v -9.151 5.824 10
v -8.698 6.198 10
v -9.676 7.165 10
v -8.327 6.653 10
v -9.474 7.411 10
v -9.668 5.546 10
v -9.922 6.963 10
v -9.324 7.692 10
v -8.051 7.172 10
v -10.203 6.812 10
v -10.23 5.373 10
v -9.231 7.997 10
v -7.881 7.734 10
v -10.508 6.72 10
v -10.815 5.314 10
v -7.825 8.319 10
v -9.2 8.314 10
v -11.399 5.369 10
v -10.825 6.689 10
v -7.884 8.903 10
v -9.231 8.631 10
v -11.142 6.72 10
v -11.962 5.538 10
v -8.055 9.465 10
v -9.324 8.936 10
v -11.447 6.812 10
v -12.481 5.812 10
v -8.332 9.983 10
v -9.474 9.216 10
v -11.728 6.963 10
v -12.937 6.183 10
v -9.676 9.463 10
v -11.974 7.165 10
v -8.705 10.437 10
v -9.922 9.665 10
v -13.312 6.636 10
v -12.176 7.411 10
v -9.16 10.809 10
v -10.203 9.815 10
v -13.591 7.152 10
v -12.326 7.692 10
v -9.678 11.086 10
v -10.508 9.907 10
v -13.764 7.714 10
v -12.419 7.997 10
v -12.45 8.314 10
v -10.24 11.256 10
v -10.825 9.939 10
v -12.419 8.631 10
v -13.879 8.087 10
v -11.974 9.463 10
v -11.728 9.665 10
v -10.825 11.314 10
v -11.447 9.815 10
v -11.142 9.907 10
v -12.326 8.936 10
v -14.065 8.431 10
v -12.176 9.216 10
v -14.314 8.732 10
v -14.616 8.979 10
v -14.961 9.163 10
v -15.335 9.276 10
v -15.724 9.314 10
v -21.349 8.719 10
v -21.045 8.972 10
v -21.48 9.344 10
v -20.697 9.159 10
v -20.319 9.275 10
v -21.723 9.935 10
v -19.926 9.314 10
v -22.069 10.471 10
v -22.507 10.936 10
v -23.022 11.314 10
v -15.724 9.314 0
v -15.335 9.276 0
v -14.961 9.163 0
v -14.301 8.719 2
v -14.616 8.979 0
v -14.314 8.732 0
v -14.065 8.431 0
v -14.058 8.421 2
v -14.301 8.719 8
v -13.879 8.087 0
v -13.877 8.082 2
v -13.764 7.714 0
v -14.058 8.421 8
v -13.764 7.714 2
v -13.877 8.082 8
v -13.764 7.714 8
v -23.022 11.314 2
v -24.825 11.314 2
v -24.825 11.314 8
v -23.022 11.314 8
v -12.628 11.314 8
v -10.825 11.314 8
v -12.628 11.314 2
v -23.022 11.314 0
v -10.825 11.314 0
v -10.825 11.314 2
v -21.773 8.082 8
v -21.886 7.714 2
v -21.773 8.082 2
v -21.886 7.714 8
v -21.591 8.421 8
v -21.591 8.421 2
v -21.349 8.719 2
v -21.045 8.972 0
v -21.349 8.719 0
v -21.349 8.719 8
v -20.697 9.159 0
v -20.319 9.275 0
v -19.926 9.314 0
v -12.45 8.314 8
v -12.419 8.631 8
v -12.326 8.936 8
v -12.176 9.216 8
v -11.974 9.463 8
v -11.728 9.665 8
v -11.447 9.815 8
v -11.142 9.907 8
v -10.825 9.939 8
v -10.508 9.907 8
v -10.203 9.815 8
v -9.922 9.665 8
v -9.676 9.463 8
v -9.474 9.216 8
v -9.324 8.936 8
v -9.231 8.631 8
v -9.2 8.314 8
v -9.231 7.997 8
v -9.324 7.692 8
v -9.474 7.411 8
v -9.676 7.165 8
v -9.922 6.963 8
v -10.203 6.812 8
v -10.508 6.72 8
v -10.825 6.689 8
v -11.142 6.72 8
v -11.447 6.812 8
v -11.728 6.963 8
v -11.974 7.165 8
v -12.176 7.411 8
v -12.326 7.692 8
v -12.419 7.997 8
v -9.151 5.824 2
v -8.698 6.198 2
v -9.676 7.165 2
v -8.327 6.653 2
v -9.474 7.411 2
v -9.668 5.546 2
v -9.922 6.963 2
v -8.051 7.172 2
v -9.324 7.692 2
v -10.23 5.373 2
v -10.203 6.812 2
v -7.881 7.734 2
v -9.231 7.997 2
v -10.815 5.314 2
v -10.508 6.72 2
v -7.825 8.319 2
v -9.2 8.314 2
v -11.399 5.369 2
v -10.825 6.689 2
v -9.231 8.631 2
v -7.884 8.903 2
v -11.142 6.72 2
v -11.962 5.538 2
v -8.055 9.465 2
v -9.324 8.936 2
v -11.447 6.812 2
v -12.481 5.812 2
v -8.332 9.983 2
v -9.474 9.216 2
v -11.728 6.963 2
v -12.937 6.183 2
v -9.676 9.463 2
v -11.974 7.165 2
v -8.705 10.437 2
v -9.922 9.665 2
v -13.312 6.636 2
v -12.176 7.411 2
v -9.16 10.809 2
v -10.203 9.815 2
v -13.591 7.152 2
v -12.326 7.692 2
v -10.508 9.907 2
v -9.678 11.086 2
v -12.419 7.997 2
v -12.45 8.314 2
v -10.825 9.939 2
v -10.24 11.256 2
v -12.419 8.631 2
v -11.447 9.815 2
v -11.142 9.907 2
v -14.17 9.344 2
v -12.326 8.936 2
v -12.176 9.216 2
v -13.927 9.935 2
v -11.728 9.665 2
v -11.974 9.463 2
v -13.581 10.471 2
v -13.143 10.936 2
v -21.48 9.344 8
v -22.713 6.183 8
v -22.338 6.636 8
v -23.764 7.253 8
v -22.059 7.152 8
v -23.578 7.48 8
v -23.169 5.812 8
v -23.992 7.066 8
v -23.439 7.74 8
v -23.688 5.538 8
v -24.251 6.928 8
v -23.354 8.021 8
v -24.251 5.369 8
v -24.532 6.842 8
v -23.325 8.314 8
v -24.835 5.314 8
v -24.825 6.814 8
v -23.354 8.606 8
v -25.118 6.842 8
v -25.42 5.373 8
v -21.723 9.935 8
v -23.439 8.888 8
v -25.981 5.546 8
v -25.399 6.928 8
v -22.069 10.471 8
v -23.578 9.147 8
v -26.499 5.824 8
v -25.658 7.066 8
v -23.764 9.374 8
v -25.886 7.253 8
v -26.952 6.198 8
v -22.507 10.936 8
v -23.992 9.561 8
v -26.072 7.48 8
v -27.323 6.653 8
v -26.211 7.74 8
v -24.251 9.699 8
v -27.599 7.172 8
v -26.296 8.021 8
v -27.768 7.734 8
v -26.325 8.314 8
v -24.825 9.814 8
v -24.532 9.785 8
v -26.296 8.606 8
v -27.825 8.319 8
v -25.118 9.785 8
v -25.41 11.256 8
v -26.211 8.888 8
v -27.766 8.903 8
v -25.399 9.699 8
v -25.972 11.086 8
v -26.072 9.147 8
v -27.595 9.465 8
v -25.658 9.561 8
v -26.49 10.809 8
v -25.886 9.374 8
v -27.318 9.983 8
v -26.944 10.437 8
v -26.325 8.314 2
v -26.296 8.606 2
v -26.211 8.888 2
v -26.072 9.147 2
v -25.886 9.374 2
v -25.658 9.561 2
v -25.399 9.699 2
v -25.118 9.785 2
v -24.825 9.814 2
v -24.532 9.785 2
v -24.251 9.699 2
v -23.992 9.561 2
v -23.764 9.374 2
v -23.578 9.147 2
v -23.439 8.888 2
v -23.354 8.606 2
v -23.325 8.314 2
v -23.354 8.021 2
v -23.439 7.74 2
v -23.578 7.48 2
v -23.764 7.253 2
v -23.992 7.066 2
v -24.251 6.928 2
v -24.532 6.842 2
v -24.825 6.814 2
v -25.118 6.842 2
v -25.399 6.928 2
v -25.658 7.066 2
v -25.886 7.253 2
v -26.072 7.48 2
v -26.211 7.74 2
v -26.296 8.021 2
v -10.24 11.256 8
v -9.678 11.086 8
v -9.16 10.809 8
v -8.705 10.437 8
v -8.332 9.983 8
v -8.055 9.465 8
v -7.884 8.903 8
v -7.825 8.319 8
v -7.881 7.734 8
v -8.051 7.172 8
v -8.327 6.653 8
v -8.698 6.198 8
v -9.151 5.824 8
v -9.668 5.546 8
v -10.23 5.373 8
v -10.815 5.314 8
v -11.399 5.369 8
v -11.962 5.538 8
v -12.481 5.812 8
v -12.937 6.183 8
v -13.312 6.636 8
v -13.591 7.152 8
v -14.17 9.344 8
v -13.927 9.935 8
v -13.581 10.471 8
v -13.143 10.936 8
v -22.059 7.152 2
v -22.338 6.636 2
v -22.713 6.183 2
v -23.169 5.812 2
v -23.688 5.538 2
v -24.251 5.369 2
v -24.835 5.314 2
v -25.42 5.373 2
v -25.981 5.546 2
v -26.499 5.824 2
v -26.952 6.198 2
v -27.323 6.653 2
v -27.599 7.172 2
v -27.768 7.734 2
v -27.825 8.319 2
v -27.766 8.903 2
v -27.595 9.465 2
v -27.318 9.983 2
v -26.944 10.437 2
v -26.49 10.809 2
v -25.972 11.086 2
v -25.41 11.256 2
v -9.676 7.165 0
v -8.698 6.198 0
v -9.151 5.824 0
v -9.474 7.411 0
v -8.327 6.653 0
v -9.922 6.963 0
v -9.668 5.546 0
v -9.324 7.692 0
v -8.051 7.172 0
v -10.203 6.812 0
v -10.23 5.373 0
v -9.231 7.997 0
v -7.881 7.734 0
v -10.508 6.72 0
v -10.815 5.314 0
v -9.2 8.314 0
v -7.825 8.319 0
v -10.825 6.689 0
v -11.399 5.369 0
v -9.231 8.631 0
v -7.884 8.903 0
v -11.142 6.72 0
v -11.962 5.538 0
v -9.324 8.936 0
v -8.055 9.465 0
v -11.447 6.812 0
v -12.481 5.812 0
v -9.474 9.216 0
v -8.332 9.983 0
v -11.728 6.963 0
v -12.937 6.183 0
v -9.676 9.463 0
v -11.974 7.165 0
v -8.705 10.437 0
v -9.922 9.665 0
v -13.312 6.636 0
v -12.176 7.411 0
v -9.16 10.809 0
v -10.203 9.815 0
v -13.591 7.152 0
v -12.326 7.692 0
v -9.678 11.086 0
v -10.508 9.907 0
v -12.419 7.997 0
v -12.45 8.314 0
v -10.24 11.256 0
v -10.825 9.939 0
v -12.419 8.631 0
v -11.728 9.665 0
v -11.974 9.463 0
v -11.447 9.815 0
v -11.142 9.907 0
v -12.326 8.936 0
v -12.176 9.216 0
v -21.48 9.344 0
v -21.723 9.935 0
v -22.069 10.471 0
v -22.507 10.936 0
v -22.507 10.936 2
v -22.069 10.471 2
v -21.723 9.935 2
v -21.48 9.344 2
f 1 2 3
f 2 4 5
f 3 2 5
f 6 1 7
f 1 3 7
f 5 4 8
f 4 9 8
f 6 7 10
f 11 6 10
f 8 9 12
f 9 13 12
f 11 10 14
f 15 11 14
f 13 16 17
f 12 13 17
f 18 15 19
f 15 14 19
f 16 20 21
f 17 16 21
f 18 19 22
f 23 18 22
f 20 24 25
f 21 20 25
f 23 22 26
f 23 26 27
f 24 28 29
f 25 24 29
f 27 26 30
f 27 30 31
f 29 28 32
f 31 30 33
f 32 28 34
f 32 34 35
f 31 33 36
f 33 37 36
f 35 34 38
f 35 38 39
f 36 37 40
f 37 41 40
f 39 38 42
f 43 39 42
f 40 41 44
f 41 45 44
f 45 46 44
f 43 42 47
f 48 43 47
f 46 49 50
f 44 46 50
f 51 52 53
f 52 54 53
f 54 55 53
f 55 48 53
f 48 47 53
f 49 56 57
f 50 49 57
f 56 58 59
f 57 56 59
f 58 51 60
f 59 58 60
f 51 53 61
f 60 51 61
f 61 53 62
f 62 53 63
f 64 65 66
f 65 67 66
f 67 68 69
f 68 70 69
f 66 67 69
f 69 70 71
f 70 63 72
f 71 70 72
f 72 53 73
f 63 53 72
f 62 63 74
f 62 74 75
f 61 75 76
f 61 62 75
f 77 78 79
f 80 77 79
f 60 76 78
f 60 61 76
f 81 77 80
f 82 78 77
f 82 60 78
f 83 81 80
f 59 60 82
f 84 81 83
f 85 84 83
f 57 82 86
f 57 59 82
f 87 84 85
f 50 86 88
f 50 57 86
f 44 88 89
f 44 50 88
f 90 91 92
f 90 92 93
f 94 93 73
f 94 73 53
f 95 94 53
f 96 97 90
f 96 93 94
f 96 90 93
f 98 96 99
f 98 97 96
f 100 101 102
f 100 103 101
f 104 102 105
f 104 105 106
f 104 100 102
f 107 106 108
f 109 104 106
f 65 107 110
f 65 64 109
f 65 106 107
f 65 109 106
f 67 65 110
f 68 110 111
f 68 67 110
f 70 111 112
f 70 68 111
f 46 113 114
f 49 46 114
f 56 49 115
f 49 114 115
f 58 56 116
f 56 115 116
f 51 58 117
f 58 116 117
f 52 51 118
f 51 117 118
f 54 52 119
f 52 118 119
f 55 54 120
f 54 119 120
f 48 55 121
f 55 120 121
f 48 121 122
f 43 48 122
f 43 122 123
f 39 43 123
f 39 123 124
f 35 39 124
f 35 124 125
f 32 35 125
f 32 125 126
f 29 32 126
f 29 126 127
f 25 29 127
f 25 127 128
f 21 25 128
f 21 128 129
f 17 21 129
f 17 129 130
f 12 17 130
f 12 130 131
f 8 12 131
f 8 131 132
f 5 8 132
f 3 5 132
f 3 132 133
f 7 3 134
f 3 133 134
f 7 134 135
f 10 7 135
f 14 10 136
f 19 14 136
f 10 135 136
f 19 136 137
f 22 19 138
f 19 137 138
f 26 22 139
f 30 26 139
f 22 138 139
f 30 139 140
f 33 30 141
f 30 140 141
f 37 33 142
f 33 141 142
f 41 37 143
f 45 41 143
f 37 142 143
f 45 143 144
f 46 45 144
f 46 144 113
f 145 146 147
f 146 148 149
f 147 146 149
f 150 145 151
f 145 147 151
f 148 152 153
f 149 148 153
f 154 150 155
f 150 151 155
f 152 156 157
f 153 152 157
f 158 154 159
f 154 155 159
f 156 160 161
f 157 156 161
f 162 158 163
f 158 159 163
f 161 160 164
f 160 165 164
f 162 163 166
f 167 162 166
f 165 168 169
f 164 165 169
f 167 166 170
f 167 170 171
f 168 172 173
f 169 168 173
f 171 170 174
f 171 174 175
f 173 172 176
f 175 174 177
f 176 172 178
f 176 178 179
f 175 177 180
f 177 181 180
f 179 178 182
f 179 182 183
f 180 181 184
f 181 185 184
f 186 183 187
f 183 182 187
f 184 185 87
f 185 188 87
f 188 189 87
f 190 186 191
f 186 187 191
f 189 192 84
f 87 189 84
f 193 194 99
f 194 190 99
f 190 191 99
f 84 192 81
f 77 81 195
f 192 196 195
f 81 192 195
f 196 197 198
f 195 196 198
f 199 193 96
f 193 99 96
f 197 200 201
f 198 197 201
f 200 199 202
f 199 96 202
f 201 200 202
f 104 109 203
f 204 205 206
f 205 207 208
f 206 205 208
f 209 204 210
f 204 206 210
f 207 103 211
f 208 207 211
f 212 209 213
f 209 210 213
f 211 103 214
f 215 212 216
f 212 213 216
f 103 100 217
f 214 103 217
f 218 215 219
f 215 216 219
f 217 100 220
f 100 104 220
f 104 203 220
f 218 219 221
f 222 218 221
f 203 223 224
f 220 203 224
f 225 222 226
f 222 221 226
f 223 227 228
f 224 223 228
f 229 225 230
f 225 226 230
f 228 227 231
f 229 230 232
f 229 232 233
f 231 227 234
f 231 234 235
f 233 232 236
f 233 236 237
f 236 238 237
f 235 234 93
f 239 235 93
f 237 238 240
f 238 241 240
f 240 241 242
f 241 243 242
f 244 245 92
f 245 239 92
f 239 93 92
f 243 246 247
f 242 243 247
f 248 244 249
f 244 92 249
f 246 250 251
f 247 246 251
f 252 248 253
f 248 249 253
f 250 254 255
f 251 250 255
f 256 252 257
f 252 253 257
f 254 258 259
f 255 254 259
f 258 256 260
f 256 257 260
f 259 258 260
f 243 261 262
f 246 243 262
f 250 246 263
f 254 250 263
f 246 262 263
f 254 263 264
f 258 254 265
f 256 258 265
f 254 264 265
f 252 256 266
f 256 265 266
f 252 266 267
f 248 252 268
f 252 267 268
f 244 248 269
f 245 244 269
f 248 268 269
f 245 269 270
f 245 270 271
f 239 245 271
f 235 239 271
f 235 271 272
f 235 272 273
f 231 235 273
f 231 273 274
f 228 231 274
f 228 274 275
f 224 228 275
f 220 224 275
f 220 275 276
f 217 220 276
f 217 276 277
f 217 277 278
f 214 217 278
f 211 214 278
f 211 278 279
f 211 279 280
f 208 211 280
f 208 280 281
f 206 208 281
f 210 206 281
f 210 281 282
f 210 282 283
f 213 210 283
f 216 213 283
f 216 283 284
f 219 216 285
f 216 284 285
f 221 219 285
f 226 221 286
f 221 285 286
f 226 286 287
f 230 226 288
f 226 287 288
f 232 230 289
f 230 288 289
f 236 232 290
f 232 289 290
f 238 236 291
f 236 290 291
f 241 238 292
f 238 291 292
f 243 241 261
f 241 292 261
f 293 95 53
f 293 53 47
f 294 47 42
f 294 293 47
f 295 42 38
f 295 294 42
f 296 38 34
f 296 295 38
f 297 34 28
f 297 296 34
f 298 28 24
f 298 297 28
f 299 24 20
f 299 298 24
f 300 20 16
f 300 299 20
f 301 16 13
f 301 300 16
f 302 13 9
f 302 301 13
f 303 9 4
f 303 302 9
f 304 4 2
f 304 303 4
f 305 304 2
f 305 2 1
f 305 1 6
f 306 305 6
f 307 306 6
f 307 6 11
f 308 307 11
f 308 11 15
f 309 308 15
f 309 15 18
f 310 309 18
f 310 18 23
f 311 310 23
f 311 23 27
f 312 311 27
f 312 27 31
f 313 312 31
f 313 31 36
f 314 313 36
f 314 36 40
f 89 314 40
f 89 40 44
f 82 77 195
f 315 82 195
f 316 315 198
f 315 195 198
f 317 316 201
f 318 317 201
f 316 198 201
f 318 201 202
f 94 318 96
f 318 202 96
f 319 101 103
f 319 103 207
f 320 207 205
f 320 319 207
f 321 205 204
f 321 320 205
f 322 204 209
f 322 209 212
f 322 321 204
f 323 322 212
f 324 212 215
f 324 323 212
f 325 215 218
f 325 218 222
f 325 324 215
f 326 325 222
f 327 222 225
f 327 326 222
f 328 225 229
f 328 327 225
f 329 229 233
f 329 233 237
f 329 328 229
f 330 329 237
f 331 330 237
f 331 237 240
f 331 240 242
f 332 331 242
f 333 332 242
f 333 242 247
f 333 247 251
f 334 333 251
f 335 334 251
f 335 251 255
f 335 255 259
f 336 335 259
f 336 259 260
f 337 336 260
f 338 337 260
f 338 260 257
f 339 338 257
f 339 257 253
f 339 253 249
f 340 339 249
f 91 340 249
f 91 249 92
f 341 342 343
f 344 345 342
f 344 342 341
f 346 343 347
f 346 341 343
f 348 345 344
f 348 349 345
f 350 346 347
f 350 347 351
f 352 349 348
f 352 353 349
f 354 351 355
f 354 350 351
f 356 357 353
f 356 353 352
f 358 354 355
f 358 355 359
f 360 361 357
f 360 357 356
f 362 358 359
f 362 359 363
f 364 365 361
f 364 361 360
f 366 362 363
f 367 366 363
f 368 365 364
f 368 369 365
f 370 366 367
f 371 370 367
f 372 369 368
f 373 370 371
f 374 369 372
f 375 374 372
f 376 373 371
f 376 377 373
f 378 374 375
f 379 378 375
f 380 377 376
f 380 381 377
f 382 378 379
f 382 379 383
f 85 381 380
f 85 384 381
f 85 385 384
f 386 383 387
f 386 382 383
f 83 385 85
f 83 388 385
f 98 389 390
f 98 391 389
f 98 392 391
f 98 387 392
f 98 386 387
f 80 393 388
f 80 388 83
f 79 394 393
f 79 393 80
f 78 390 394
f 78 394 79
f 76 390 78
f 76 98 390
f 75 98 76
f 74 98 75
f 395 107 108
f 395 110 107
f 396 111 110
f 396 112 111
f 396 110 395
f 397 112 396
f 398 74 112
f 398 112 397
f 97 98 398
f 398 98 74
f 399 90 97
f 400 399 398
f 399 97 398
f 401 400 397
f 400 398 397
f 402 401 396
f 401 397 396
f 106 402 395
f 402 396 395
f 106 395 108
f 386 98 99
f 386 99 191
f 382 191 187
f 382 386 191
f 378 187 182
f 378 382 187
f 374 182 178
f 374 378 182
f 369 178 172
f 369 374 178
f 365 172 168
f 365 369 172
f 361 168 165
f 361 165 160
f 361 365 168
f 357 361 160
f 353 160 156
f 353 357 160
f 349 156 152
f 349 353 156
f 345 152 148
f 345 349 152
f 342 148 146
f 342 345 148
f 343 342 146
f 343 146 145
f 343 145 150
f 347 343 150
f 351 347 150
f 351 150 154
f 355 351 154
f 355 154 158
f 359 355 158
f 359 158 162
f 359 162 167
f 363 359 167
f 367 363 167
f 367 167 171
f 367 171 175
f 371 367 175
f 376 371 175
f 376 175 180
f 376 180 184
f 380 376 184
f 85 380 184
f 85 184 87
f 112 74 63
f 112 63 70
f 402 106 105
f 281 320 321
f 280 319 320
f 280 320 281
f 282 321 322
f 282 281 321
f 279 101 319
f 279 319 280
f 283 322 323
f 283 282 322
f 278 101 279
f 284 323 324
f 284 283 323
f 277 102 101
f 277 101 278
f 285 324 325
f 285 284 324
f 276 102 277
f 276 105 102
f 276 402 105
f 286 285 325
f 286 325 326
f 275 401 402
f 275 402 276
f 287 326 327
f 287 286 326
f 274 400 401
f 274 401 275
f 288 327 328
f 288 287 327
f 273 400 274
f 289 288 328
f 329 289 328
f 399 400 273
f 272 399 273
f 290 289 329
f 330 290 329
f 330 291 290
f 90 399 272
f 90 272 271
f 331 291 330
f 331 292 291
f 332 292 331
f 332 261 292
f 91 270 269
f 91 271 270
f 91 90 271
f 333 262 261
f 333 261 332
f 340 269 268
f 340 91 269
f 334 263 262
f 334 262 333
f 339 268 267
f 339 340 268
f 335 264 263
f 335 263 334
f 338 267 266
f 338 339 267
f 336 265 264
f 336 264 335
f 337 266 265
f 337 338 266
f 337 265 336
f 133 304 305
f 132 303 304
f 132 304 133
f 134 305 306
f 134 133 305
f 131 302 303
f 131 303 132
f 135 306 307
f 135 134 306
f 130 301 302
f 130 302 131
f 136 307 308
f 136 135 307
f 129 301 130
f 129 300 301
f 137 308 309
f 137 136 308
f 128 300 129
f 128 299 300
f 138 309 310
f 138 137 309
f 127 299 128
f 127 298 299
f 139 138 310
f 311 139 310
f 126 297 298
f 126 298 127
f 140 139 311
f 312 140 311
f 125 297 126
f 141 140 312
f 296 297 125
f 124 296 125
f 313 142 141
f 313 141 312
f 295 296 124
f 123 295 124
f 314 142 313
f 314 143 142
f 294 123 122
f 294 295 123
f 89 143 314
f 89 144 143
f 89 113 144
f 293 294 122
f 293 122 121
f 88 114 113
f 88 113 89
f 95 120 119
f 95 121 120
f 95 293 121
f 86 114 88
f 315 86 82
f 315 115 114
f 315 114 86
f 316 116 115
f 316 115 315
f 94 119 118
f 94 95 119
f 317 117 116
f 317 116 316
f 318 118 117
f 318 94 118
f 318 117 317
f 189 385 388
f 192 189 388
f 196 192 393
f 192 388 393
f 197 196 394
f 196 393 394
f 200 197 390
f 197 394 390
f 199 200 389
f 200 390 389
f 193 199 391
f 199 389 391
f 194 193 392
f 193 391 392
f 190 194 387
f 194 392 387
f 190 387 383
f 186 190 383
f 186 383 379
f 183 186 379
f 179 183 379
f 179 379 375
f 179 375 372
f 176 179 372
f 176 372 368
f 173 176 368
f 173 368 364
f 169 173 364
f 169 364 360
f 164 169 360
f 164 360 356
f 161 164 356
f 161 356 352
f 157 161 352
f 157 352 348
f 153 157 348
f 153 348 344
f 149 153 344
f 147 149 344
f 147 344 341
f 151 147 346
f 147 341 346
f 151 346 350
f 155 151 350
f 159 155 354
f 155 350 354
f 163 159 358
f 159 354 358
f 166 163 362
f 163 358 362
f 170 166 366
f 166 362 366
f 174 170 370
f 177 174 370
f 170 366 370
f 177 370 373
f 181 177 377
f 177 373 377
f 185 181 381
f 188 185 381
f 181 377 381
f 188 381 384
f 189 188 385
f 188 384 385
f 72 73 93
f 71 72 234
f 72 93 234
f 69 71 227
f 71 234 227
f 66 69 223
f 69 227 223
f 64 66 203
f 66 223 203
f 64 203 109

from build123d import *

# Parameters (mm, degrees)
ESTRUSIONE_ESTRUSIONE1_DEPTH = 10
SCHIZZO5_R                   = 1.625
SCHIZZO5_R_2                 = 1.5
TAGLIO_ESTRUSIONE1_DEPTH     = 10
SCHIZZO6_R                   = 3.5
TAGLIO_ESTRUSIONE2_DEPTH     = 2
TAGLIO_ESTRUSIONE3_START     = -8
SCHIZZO6_2_R                 = 3.5
TAGLIO_ESTRUSIONE3_DEPTH     = 12
TAGLIO_ESTRUSIONE4_START     = -2
SCHIZZO7_R                   = 3.5
TAGLIO_ESTRUSIONE4_DEPTH     = 6
RACCORDO1_R                  = 2
RACCORDO2_R                  = 2


with BuildPart() as part:
    # Schizzo1 → Estrusione-Estrusione1 (new body)
    with BuildSketch(Plane.XY):
        with BuildLine():
            Line((-24.824967097, 11.313668705), (-10.824967097, 11.313668705))
            ThreePointArc((-10.824967097, 11.313668705), (-9.092916289, 5.864178962), (-13.653394221, 9.313668705))
            Line((-13.653394221, 9.313668705), (-21.996539972, 9.313668705))
            ThreePointArc((-21.996539972, 9.313668705), (-26.557017904, 5.864178962), (-24.824967097, 11.313668705))
        make_face()
    extrude(amount=ESTRUSIONE_ESTRUSIONE1_DEPTH)

    # Schizzo5 → Taglio-Estrusione1 (cut)
    with BuildSketch(Plane(origin=(0, 0, 0), x_dir=(-1, 0, 0), z_dir=(0, 0, -1))):
        with Locations((10.824967097, 8.313668705)):
            Circle(SCHIZZO5_R)
        with Locations((24.824967097, 8.313668705)):
            Circle(SCHIZZO5_R_2)
    extrude(amount=-TAGLIO_ESTRUSIONE1_DEPTH, mode=Mode.SUBTRACT)

    # Schizzo6 → Taglio-Estrusione2 (cut)
    with BuildSketch(Plane(origin=(0, 0, 0), x_dir=(-1, 0, 0), z_dir=(0, 0, -1))):
        with Locations((24.824967097, 8.313668705)):
            Circle(SCHIZZO6_R)
    extrude(amount=-TAGLIO_ESTRUSIONE2_DEPTH, mode=Mode.SUBTRACT)

    # Schizzo6<2> → Taglio-Estrusione3 (cut)
    with BuildSketch(Plane(origin=(0, 0, 0), x_dir=(-1, 0, 0), z_dir=(0, 0, -1)).offset(TAGLIO_ESTRUSIONE3_START)):
        with Locations((24.824967097, 8.313668705)):
            Circle(SCHIZZO6_2_R)
    extrude(amount=-TAGLIO_ESTRUSIONE3_DEPTH, mode=Mode.SUBTRACT)

    # Schizzo7 → Taglio-Estrusione4 (cut)
    with BuildSketch(Plane(origin=(0, 0, 0), x_dir=(-1, 0, 0), z_dir=(0, 0, -1)).offset(TAGLIO_ESTRUSIONE4_START)):
        with Locations((10.824967097, 8.313668705)):
            Circle(SCHIZZO7_R)
    extrude(amount=-TAGLIO_ESTRUSIONE4_DEPTH, mode=Mode.SUBTRACT)

    # Raccordo1
    raccordo1_edges = [part.edges().sort_by_distance(p)[0] for p in [
        (-21.996539972, 9.313668705, 5),
    ]]
    fillet(raccordo1_edges, radius=RACCORDO1_R)

    # Raccordo2
    raccordo2_edges = [part.edges().sort_by_distance(p)[0] for p in [
        (-13.653394221, 9.313668705, 1),
    ]]
    fillet(raccordo2_edges, radius=RACCORDO2_R)


solid = part.part
